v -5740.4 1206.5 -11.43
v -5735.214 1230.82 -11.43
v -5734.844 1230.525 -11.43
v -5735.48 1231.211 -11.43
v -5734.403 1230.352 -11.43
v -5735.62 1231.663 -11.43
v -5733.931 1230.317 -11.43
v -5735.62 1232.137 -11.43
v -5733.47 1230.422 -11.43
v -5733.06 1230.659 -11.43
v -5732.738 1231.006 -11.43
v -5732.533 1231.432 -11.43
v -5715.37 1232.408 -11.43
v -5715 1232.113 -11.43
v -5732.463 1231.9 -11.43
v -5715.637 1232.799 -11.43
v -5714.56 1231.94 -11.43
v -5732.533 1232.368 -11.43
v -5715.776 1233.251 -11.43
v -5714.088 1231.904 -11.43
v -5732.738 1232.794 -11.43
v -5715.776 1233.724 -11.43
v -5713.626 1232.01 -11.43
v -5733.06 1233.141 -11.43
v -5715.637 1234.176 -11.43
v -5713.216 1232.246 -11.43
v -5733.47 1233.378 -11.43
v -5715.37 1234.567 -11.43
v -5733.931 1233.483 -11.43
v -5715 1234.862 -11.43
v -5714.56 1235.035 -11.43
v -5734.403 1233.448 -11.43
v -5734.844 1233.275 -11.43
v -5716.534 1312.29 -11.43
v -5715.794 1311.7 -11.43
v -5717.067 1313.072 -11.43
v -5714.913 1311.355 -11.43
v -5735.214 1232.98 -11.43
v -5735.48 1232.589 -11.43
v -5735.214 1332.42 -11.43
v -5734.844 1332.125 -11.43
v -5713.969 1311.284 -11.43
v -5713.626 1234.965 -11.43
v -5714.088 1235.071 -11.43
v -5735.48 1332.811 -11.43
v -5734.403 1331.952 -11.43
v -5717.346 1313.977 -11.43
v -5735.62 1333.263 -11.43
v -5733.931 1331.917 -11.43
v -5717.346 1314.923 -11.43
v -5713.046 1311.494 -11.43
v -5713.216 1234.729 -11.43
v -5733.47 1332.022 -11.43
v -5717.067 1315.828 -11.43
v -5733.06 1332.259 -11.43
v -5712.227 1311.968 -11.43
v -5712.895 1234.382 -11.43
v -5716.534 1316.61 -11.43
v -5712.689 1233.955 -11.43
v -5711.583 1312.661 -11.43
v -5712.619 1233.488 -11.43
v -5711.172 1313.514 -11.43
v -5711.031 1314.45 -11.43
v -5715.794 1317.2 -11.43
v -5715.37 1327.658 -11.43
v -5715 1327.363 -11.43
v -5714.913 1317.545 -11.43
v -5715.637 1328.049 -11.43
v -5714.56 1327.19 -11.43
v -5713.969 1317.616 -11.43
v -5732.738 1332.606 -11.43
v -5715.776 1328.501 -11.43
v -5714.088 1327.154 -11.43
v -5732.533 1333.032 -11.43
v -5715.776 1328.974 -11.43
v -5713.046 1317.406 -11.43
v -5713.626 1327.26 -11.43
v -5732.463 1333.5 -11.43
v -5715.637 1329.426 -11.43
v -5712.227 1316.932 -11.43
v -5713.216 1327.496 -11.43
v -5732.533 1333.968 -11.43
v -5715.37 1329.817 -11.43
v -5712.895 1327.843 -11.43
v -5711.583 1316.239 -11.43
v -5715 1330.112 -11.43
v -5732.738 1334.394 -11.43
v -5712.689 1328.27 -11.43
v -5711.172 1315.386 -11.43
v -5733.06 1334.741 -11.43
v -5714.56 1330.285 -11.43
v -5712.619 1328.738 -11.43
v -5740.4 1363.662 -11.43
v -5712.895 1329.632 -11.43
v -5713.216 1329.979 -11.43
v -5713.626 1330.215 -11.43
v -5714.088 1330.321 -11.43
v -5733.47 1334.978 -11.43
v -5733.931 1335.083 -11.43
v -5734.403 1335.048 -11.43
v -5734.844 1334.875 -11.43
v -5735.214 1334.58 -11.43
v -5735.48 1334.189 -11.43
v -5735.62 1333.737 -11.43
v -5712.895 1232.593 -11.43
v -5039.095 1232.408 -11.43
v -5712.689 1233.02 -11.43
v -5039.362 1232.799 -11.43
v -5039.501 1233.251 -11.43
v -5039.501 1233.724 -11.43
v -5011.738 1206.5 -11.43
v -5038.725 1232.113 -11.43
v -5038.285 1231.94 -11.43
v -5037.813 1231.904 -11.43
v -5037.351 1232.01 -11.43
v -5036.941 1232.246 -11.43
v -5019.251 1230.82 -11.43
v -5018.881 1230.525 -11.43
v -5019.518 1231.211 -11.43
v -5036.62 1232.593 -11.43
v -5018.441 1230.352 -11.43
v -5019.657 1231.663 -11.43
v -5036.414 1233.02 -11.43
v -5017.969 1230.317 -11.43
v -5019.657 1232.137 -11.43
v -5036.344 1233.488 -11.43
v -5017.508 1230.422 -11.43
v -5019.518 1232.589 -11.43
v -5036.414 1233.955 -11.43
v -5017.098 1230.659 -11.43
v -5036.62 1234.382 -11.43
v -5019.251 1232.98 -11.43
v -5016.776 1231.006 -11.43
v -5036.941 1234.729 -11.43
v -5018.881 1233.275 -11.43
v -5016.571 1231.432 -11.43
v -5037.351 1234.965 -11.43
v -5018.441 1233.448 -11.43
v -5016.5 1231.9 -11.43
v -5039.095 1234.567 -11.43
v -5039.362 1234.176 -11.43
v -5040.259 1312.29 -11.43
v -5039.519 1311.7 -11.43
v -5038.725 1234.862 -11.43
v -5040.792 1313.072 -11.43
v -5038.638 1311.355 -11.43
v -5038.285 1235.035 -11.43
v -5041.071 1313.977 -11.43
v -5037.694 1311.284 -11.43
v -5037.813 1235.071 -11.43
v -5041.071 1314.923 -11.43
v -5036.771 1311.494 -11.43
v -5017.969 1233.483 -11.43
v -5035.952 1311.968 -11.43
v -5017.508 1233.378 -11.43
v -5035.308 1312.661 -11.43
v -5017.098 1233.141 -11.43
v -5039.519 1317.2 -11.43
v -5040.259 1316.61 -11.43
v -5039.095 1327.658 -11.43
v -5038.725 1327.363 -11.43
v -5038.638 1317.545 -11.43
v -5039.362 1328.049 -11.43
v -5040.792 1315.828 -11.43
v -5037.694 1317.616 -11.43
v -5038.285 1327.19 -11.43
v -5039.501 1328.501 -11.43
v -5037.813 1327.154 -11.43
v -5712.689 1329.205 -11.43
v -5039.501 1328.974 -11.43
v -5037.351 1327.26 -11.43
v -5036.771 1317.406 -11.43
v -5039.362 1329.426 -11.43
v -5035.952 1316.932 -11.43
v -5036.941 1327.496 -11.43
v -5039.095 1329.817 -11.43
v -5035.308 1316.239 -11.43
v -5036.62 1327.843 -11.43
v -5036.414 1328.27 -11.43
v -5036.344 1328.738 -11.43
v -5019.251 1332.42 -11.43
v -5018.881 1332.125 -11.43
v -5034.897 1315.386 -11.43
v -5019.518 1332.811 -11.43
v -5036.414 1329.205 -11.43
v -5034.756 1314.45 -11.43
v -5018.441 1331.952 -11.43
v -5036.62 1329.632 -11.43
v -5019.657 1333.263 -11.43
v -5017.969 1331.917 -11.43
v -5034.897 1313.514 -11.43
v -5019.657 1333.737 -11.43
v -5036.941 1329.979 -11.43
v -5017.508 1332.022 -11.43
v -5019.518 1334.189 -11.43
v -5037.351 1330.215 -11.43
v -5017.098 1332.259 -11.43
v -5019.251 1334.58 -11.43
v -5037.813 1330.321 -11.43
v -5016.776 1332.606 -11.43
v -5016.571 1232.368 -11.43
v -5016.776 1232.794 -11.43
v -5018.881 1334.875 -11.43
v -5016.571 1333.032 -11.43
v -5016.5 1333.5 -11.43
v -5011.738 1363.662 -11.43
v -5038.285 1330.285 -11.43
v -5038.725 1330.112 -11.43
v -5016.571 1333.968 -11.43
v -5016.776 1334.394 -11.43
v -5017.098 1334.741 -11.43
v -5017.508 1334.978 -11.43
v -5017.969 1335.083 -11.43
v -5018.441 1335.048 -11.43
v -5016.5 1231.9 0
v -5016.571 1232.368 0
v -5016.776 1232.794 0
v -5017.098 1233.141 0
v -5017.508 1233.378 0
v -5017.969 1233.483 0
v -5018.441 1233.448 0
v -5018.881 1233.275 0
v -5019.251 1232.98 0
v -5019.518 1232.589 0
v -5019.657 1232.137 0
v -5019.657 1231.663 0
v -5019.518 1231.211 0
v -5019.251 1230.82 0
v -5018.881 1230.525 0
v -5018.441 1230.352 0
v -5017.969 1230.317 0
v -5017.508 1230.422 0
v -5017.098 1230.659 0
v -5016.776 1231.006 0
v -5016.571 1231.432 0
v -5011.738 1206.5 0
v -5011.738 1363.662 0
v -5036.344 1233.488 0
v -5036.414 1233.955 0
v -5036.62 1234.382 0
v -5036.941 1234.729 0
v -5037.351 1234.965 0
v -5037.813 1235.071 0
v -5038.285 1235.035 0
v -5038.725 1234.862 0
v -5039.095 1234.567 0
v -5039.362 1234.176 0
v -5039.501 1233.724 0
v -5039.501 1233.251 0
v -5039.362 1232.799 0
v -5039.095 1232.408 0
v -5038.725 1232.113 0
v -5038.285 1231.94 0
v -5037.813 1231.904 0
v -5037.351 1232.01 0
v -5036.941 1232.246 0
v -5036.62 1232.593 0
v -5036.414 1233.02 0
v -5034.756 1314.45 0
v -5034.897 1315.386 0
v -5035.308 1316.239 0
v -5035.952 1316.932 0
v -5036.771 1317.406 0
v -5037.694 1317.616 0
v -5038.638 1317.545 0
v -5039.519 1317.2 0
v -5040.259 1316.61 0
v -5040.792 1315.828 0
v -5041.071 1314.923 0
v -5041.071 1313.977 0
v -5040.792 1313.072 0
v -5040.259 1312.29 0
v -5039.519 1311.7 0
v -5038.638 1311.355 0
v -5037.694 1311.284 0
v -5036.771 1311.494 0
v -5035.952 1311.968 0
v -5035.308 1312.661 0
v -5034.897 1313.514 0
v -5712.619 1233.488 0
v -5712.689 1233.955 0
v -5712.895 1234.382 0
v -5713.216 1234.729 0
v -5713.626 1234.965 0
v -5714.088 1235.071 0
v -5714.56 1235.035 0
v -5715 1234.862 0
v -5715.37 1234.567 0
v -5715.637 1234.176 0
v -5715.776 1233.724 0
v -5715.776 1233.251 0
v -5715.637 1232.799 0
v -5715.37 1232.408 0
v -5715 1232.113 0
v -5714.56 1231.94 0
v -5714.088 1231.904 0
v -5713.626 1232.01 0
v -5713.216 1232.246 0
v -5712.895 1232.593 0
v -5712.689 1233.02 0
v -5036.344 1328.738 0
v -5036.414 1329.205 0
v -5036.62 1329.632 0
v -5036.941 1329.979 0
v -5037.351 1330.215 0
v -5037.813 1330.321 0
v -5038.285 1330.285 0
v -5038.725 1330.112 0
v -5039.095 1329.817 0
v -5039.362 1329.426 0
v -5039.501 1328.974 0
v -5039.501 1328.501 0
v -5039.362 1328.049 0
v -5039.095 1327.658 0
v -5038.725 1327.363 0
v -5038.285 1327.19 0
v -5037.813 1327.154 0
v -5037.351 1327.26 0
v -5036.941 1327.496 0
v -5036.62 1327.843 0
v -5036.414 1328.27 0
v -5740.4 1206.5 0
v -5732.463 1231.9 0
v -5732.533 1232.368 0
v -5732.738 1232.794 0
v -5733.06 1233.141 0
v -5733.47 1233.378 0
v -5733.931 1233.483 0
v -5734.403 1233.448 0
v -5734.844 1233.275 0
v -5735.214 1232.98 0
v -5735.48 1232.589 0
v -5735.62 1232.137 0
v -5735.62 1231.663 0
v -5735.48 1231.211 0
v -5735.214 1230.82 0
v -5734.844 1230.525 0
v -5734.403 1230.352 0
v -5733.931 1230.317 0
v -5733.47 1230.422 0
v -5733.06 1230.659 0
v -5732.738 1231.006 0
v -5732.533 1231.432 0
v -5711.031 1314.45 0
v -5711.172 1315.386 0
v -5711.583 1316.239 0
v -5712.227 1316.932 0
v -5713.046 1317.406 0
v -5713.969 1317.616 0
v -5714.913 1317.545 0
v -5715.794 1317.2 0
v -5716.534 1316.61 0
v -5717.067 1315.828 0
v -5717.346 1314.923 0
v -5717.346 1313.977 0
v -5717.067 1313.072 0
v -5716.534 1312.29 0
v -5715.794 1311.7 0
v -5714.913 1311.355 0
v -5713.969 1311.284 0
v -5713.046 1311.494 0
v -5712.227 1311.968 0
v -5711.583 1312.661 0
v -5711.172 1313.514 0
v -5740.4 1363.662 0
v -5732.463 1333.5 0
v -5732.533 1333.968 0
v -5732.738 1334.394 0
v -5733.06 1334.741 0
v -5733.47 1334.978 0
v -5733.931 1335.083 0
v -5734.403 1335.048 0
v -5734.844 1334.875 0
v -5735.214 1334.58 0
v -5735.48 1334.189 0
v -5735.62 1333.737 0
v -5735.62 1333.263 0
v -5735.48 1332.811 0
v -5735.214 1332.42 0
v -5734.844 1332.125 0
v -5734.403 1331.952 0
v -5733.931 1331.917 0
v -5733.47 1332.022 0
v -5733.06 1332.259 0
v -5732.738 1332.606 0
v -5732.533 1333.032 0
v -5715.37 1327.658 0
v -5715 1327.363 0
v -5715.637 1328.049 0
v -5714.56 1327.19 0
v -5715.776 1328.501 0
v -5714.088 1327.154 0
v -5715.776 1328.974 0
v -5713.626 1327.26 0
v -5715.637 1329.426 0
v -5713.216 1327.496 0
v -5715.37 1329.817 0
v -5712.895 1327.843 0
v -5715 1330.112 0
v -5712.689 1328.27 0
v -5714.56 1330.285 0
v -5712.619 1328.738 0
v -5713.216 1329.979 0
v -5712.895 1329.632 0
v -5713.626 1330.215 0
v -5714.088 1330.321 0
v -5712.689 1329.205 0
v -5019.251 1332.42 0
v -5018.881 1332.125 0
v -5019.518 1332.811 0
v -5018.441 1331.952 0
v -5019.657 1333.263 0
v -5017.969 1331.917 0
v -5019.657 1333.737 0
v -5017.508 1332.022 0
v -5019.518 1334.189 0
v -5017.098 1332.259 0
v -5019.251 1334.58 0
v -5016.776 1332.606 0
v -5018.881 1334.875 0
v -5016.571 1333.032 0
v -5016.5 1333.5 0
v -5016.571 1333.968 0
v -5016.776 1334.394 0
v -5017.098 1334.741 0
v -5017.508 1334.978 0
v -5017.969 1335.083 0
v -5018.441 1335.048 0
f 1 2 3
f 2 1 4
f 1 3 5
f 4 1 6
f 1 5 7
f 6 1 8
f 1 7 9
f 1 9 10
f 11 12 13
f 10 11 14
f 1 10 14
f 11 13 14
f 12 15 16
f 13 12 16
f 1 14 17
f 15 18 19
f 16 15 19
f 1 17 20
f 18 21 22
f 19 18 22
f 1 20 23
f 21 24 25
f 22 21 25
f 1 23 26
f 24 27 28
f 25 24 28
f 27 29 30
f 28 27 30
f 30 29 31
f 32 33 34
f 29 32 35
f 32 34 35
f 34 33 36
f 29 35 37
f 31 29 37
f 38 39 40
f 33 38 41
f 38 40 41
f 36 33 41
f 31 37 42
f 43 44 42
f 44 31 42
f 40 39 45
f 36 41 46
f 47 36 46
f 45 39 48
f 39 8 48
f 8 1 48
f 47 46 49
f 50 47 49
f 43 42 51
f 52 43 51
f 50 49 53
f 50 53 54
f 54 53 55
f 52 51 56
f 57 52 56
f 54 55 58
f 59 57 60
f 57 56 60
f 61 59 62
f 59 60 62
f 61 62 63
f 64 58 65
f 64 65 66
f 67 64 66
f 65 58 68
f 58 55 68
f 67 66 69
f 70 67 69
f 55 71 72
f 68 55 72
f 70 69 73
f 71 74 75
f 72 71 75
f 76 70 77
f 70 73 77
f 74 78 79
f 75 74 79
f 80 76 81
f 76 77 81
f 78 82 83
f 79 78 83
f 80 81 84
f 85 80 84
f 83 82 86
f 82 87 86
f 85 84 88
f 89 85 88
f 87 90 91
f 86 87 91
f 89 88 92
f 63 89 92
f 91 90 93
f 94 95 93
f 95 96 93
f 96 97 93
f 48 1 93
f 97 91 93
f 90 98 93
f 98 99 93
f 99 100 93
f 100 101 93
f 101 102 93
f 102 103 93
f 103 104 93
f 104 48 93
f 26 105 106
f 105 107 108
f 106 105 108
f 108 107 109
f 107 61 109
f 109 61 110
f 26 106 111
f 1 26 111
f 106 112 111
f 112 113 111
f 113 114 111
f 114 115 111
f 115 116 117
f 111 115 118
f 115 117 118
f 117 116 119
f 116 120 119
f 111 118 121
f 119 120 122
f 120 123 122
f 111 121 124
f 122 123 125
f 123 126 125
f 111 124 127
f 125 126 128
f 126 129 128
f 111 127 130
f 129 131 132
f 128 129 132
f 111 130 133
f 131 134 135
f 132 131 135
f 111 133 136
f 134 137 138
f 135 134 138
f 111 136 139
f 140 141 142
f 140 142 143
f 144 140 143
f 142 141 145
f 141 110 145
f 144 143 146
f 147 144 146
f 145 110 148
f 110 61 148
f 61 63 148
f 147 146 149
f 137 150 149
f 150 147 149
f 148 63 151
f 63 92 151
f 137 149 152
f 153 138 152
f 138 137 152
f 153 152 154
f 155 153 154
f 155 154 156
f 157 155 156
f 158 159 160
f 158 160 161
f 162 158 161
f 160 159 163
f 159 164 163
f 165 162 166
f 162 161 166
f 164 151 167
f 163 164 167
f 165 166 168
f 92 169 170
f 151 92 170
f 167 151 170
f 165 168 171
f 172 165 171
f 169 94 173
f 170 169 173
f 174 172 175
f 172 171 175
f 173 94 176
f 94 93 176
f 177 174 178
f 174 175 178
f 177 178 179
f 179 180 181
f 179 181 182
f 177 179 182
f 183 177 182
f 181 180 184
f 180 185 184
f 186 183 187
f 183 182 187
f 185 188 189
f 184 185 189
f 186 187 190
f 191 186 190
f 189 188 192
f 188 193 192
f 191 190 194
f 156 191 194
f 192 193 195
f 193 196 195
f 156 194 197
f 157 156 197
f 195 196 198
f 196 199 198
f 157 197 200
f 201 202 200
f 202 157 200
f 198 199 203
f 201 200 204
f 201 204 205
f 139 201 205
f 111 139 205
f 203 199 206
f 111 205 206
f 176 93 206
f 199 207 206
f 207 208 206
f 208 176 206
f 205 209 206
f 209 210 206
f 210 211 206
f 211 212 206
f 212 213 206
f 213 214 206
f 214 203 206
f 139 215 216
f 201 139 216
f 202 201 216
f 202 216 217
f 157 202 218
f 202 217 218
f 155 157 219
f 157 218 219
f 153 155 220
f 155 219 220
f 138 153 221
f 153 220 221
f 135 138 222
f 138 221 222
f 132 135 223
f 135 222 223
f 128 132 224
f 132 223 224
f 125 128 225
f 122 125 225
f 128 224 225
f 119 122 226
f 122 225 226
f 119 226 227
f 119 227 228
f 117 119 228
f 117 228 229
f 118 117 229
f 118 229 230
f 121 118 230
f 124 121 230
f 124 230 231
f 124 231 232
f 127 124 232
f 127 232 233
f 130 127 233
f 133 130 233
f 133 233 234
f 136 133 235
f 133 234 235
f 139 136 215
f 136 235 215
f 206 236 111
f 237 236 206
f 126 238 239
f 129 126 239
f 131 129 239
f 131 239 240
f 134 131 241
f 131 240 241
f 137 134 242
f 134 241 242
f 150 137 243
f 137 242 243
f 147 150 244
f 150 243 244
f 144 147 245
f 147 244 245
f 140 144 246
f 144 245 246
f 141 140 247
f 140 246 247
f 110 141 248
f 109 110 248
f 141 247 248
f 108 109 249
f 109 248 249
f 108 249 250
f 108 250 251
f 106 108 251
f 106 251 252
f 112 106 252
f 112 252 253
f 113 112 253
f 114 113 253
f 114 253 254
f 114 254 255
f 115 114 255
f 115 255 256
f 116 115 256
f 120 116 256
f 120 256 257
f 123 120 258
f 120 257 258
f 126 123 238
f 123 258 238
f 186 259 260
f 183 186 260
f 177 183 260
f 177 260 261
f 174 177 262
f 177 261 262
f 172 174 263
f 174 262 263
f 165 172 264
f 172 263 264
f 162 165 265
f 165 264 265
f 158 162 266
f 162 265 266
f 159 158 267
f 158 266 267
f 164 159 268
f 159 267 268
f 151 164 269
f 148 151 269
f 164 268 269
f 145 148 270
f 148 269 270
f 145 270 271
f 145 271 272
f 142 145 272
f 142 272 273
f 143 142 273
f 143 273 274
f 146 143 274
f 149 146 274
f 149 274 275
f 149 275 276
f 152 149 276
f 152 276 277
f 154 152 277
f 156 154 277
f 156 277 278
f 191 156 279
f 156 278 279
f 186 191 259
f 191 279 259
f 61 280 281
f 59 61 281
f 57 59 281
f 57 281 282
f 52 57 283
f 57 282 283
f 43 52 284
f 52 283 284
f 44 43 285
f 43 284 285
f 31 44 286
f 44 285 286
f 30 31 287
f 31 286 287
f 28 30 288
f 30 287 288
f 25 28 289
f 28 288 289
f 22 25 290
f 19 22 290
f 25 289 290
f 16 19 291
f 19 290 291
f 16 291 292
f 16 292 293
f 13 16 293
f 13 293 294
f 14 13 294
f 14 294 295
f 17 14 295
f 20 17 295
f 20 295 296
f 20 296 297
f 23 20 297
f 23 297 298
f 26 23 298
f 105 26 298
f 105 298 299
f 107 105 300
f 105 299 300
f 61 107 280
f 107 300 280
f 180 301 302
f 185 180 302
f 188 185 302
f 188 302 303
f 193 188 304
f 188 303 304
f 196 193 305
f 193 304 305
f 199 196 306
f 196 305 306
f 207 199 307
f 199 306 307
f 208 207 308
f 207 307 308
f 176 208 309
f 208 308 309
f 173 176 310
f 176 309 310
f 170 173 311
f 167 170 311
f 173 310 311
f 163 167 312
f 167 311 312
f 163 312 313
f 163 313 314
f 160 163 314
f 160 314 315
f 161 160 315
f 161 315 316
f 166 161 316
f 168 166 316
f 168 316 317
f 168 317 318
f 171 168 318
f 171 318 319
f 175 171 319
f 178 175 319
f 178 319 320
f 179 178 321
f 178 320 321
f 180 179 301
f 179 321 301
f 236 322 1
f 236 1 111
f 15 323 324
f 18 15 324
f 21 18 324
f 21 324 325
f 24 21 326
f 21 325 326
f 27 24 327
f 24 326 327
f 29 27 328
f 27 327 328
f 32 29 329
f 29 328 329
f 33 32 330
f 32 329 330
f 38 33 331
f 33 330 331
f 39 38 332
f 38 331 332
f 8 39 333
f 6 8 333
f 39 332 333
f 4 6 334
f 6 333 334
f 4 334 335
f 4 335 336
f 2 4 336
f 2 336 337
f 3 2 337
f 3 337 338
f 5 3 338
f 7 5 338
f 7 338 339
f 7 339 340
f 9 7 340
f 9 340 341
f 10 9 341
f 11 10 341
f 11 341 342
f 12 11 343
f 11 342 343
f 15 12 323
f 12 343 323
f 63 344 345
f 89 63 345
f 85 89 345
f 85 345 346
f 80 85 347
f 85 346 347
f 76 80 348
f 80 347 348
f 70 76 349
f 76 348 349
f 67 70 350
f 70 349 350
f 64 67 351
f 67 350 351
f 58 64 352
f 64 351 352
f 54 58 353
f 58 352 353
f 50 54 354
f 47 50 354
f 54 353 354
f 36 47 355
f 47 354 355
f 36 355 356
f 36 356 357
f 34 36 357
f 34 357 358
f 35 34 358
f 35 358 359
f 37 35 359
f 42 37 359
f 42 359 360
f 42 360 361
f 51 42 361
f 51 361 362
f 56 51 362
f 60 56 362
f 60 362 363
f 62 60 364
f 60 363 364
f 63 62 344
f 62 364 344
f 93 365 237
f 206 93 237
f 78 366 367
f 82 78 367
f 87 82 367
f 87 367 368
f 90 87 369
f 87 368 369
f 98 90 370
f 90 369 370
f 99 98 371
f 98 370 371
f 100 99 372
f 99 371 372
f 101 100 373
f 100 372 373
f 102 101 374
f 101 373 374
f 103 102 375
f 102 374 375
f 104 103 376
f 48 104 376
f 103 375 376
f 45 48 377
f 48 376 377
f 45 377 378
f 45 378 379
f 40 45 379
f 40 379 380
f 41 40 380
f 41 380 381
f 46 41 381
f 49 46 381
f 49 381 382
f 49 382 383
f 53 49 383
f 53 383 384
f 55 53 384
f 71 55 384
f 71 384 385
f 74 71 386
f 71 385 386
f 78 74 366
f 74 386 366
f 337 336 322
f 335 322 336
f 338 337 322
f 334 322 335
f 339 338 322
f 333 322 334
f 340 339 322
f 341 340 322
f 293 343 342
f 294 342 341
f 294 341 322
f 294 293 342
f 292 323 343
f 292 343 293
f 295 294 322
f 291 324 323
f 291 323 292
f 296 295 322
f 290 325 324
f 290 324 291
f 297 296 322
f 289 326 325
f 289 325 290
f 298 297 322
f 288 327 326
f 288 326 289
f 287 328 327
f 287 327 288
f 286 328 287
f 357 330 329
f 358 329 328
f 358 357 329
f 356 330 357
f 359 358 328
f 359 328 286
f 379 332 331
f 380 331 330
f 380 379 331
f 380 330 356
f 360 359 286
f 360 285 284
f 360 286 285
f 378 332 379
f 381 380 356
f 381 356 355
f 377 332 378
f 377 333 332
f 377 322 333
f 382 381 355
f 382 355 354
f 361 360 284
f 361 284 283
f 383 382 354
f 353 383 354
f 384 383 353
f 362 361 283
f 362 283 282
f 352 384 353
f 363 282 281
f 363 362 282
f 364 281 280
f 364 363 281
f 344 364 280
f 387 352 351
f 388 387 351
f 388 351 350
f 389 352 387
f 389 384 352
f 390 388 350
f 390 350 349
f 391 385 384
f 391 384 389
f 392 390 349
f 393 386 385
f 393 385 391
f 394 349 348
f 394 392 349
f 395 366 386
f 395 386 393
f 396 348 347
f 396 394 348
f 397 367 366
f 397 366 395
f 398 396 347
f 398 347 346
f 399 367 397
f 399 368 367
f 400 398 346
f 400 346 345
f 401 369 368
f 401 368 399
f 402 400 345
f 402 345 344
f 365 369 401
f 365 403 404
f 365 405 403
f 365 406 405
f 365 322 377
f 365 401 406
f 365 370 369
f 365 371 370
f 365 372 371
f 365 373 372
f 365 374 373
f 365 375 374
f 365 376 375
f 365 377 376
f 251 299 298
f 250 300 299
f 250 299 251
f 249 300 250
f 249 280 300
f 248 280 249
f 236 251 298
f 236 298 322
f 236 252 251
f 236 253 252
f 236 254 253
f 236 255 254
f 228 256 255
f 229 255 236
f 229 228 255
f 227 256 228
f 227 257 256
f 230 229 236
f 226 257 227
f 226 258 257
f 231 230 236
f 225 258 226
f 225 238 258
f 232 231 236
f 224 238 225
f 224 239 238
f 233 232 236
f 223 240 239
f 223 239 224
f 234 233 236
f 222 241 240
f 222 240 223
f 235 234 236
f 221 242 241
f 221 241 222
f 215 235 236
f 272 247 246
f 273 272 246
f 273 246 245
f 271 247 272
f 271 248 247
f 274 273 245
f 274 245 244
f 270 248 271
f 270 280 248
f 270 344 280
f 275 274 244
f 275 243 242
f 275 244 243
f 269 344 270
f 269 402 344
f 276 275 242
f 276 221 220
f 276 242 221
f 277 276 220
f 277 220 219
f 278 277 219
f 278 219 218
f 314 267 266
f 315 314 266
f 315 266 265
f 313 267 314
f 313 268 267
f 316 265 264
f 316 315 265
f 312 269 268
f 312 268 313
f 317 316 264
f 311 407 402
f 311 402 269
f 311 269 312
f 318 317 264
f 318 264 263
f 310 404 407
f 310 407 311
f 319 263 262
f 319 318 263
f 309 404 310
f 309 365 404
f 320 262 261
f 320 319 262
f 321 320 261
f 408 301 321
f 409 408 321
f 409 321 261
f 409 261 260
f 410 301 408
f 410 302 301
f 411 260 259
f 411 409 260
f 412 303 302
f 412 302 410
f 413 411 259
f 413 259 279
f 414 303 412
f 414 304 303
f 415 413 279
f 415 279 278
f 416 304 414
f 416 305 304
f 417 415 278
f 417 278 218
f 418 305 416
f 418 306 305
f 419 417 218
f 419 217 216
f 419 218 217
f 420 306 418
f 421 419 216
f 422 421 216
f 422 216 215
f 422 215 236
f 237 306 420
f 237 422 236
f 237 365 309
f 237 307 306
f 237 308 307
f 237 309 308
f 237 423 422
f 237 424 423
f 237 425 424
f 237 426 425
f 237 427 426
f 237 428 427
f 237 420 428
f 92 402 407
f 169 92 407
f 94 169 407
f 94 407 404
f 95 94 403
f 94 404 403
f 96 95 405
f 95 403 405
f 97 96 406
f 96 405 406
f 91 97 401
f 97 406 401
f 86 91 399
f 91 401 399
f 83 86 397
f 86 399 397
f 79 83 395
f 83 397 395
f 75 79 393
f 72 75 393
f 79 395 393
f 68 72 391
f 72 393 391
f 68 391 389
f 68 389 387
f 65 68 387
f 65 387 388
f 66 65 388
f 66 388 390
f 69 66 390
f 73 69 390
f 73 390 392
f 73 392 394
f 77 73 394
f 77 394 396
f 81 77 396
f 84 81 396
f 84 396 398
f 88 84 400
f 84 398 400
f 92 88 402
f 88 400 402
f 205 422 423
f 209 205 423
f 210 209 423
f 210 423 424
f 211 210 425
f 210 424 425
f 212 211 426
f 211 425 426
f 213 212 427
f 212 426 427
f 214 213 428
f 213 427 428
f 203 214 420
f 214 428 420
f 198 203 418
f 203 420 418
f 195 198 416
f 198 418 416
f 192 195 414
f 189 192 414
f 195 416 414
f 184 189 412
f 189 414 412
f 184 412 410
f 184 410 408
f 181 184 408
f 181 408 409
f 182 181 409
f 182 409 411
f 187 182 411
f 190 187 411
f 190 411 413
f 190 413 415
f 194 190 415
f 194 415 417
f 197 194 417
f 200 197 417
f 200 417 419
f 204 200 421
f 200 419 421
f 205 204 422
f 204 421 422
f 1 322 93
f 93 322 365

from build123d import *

# Parameters (mm, degrees)
LIDOUTLINE_W               = 728.6625
LIDOUTLINE_H               = 157.1625
LIDOUTLINE_THICKNESS_DEPTH = 11.43
LID_MOUNTINGHOLES_R        = 3.175
LID_MOUNTINGHOLES_R_2      = 1.5875
CUT_EXTRUDE1_DEPTH         = 11.43


with BuildPart() as part:
    # LidOutline → LidOutline_Thickness (new body)
    with BuildSketch(Plane.XY):
        with Locations((-5376.06875, 1285.08125)):
            Rectangle(LIDOUTLINE_W, LIDOUTLINE_H)
    extrude(amount=-LIDOUTLINE_THICKNESS_DEPTH)

    # Lid_MountingHoles → Cut-Extrude1 (cut)
    with BuildSketch(Plane.XY):
        with Locations((-5714.20625, 1314.45)):
            Circle(LID_MOUNTINGHOLES_R)
        with Locations((-5714.20625, 1328.7375)):
            Circle(LID_MOUNTINGHOLES_R_2)
        with Locations((-5734.05, 1333.5)):
            Circle(LID_MOUNTINGHOLES_R_2)
        with Locations((-5734.05, 1231.9)):
            Circle(LID_MOUNTINGHOLES_R_2)
        with Locations((-5714.20625, 1233.4875)):
            Circle(LID_MOUNTINGHOLES_R_2)
        with Locations((-5037.93125, 1314.45)):
            Circle(LID_MOUNTINGHOLES_R)
        with Locations((-5037.93125, 1328.7375)):
            Circle(LID_MOUNTINGHOLES_R_2)
        with Locations((-5018.0875, 1333.5)):
            Circle(LID_MOUNTINGHOLES_R_2)
        with Locations((-5037.93125, 1233.4875)):
            Circle(LID_MOUNTINGHOLES_R_2)
        with Locations((-5018.0875, 1231.9)):
            Circle(LID_MOUNTINGHOLES_R_2)
    extrude(amount=-CUT_EXTRUDE1_DEPTH, mode=Mode.SUBTRACT)


solid = part.part
